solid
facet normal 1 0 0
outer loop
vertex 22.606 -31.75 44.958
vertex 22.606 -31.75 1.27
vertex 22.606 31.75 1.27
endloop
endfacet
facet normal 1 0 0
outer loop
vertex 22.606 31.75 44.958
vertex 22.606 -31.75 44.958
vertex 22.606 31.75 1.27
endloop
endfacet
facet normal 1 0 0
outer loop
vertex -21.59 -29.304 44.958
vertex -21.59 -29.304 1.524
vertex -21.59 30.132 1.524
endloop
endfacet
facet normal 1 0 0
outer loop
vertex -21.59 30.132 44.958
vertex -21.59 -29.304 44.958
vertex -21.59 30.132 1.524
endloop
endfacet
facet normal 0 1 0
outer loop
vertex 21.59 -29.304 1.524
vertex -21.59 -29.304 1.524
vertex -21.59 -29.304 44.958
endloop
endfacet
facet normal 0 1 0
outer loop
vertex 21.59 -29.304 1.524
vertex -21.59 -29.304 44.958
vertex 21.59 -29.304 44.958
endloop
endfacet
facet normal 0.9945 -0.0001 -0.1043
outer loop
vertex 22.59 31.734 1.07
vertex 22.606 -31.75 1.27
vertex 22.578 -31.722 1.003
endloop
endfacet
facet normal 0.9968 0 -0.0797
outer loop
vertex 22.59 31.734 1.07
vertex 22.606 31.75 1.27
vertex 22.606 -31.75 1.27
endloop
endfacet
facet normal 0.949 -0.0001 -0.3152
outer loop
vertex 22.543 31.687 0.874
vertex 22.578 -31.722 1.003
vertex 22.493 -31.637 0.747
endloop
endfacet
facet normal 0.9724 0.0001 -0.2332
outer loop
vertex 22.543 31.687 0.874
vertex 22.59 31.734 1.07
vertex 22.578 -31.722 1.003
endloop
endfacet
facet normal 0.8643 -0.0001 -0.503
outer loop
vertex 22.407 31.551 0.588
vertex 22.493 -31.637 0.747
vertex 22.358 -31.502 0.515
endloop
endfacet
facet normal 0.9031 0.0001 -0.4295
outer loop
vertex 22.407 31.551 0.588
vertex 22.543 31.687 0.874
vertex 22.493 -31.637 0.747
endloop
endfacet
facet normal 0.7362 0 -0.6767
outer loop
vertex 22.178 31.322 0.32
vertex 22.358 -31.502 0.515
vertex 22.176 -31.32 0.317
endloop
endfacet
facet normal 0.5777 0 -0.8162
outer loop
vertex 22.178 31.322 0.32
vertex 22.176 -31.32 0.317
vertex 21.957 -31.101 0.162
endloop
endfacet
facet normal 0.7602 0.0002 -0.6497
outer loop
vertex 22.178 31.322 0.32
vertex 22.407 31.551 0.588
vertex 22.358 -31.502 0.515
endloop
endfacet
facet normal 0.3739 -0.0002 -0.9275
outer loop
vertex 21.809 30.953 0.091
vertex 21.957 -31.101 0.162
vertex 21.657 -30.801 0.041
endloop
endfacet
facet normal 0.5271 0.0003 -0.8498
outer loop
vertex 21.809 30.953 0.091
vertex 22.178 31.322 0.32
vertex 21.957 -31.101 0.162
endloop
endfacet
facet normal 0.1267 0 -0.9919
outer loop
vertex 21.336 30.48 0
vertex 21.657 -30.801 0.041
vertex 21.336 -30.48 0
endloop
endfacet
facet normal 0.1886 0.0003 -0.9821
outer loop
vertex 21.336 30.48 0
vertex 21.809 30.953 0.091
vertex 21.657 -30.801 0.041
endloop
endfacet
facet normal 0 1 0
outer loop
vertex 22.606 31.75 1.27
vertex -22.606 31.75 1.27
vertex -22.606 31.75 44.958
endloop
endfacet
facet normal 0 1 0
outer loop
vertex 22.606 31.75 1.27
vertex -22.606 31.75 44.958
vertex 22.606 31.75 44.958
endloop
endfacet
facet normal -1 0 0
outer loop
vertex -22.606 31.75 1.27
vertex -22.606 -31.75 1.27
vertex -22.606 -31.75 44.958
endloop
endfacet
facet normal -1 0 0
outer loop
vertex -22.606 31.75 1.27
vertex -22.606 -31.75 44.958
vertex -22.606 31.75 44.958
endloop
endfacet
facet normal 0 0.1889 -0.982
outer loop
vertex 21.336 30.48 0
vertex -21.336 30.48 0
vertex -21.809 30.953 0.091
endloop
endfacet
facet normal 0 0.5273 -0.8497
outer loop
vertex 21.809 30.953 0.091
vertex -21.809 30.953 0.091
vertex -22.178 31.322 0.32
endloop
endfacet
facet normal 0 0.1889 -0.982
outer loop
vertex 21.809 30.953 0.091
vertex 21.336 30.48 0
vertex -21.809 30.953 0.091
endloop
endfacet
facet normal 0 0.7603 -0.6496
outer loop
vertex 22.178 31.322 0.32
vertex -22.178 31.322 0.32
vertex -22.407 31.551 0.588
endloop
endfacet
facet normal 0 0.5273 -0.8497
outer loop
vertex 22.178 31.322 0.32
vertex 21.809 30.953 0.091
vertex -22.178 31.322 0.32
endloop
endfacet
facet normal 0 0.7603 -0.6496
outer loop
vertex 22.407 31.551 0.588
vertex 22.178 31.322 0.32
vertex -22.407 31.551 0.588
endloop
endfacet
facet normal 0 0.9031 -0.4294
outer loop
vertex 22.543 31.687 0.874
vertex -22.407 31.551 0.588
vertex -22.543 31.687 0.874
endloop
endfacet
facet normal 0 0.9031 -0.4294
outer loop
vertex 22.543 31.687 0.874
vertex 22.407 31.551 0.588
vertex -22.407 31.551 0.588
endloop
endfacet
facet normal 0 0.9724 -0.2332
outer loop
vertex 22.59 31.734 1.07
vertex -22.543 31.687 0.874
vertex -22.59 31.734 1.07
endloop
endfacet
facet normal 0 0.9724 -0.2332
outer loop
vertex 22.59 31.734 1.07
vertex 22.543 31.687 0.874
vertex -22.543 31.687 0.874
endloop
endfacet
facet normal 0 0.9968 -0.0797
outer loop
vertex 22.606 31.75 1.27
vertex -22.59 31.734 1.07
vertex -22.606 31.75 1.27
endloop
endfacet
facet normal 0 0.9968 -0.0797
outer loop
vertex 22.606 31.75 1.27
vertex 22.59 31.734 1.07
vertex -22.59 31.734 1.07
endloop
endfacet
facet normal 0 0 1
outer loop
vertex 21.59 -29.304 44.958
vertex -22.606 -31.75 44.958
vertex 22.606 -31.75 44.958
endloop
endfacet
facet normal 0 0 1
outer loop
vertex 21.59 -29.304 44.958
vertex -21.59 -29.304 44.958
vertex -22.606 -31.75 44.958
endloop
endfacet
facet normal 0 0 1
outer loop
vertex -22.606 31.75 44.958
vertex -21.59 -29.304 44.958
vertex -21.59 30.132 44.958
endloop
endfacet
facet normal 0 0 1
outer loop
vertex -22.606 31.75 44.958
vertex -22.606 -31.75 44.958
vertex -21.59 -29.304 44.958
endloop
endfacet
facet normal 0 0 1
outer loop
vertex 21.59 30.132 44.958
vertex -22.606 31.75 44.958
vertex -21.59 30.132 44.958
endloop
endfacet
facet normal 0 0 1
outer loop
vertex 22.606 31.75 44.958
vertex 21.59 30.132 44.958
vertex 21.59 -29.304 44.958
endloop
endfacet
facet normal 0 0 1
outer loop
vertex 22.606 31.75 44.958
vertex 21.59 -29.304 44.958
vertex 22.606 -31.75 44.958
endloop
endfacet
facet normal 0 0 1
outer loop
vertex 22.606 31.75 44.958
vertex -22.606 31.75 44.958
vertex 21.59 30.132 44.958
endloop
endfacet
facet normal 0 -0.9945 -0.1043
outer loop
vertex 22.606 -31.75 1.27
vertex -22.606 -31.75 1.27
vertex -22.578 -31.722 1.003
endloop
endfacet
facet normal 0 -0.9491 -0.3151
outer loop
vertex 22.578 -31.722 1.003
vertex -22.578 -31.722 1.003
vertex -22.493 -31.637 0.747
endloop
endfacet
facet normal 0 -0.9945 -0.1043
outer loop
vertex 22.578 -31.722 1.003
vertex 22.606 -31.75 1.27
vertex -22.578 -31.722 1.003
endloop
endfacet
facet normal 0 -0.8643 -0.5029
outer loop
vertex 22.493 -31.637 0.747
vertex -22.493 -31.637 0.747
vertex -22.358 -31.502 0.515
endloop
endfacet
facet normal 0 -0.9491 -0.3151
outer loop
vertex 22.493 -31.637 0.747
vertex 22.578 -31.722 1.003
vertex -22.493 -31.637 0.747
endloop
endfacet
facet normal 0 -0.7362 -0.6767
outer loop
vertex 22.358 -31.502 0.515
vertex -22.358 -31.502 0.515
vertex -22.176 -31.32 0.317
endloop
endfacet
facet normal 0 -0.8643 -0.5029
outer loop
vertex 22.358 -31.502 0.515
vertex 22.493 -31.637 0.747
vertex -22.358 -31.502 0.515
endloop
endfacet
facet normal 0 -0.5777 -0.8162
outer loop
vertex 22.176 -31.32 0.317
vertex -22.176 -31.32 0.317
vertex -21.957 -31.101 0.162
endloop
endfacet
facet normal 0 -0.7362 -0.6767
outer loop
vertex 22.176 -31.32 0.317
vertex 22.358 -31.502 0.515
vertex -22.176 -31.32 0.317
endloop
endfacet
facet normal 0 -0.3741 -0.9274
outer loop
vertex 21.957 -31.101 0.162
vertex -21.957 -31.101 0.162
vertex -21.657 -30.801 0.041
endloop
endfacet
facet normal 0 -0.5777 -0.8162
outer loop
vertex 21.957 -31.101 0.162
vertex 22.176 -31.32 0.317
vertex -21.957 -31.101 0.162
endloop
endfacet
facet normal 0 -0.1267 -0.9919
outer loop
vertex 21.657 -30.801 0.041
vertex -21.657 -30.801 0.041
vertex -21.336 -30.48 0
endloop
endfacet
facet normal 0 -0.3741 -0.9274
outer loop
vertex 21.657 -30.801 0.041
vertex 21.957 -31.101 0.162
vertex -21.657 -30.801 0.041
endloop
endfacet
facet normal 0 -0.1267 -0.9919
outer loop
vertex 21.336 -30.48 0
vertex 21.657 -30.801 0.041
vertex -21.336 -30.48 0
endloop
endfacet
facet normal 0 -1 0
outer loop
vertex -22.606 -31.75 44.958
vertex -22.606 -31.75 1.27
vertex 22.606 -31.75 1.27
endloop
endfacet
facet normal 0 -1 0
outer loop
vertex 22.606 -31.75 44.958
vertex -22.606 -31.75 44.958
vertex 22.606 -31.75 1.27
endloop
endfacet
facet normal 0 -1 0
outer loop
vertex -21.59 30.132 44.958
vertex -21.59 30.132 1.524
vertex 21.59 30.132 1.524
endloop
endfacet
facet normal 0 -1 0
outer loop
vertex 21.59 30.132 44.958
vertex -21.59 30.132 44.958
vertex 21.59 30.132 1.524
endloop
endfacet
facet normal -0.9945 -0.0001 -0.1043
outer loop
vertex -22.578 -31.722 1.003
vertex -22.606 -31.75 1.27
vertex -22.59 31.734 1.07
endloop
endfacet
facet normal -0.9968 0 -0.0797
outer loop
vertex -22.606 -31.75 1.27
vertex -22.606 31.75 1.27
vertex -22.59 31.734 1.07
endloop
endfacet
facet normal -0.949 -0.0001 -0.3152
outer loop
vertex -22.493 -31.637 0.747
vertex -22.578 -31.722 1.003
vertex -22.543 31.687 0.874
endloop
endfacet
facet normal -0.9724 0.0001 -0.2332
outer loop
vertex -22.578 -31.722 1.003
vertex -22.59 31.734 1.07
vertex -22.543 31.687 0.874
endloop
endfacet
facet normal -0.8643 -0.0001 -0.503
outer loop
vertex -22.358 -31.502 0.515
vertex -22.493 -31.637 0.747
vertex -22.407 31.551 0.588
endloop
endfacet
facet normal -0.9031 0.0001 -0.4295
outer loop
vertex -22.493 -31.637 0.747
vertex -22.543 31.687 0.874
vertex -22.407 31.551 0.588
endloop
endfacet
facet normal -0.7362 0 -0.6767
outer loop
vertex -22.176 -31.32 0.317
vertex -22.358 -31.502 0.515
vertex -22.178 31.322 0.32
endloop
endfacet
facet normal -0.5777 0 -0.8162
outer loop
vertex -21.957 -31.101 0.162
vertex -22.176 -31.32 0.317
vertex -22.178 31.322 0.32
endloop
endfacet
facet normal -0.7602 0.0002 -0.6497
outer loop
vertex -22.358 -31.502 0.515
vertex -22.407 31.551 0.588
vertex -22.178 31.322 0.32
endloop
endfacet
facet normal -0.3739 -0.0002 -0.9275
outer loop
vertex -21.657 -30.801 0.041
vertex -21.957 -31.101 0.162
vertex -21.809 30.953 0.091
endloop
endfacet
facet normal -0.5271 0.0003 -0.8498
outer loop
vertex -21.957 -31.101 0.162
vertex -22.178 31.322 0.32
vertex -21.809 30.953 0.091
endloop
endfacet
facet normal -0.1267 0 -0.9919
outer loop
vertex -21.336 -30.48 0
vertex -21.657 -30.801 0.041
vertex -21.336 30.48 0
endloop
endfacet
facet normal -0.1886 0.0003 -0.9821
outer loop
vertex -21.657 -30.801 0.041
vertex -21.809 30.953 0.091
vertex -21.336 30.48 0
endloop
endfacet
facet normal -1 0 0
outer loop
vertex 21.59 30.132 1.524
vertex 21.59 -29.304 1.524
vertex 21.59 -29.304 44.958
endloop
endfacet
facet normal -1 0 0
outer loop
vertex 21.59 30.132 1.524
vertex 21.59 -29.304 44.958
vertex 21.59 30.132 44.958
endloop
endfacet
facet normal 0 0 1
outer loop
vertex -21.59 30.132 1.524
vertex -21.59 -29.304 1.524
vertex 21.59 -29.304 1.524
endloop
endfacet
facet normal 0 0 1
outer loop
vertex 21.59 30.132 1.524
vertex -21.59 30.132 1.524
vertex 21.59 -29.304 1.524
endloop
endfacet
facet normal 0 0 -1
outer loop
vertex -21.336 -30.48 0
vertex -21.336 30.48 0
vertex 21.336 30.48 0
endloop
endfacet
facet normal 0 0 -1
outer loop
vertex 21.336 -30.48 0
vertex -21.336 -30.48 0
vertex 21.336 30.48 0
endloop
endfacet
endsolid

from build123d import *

# Parameters (mm, degrees)
F0_W     = 45.212
F0_H     = 63.5
F1_DEPTH = 1.524
F2_W     = 45.212
F2_H     = 63.5
F2_W_2   = 43.18
F2_H_2   = 59.435986
F3_DEPTH = 43.434
F4_R     = 1.27


with BuildPart() as f1:
    # F0 (on Top) → F1 (new body)
    with BuildSketch(Plane.XY):
        Rectangle(F0_W, F0_H)
    extrude(amount=F1_DEPTH)

    # F2 (on face) → F3 (join)
    with BuildSketch(Plane.XY.offset(1.524)):
        Rectangle(F2_W, F2_H)
        with Locations((0, 0.413703)):
            Rectangle(F2_W_2, F2_H_2, mode=Mode.SUBTRACT)
    extrude(amount=F3_DEPTH)

    # F4
    f4_edges = [f1.edges().sort_by_distance(p)[0] for p in [
        (0, 31.75, 0),
        (-22.606, 0, 0),
        (0, -31.75, 0),
        (22.606, 0, 0),
    ]]
    fillet(f4_edges, radius=F4_R)


solid = f1.part
